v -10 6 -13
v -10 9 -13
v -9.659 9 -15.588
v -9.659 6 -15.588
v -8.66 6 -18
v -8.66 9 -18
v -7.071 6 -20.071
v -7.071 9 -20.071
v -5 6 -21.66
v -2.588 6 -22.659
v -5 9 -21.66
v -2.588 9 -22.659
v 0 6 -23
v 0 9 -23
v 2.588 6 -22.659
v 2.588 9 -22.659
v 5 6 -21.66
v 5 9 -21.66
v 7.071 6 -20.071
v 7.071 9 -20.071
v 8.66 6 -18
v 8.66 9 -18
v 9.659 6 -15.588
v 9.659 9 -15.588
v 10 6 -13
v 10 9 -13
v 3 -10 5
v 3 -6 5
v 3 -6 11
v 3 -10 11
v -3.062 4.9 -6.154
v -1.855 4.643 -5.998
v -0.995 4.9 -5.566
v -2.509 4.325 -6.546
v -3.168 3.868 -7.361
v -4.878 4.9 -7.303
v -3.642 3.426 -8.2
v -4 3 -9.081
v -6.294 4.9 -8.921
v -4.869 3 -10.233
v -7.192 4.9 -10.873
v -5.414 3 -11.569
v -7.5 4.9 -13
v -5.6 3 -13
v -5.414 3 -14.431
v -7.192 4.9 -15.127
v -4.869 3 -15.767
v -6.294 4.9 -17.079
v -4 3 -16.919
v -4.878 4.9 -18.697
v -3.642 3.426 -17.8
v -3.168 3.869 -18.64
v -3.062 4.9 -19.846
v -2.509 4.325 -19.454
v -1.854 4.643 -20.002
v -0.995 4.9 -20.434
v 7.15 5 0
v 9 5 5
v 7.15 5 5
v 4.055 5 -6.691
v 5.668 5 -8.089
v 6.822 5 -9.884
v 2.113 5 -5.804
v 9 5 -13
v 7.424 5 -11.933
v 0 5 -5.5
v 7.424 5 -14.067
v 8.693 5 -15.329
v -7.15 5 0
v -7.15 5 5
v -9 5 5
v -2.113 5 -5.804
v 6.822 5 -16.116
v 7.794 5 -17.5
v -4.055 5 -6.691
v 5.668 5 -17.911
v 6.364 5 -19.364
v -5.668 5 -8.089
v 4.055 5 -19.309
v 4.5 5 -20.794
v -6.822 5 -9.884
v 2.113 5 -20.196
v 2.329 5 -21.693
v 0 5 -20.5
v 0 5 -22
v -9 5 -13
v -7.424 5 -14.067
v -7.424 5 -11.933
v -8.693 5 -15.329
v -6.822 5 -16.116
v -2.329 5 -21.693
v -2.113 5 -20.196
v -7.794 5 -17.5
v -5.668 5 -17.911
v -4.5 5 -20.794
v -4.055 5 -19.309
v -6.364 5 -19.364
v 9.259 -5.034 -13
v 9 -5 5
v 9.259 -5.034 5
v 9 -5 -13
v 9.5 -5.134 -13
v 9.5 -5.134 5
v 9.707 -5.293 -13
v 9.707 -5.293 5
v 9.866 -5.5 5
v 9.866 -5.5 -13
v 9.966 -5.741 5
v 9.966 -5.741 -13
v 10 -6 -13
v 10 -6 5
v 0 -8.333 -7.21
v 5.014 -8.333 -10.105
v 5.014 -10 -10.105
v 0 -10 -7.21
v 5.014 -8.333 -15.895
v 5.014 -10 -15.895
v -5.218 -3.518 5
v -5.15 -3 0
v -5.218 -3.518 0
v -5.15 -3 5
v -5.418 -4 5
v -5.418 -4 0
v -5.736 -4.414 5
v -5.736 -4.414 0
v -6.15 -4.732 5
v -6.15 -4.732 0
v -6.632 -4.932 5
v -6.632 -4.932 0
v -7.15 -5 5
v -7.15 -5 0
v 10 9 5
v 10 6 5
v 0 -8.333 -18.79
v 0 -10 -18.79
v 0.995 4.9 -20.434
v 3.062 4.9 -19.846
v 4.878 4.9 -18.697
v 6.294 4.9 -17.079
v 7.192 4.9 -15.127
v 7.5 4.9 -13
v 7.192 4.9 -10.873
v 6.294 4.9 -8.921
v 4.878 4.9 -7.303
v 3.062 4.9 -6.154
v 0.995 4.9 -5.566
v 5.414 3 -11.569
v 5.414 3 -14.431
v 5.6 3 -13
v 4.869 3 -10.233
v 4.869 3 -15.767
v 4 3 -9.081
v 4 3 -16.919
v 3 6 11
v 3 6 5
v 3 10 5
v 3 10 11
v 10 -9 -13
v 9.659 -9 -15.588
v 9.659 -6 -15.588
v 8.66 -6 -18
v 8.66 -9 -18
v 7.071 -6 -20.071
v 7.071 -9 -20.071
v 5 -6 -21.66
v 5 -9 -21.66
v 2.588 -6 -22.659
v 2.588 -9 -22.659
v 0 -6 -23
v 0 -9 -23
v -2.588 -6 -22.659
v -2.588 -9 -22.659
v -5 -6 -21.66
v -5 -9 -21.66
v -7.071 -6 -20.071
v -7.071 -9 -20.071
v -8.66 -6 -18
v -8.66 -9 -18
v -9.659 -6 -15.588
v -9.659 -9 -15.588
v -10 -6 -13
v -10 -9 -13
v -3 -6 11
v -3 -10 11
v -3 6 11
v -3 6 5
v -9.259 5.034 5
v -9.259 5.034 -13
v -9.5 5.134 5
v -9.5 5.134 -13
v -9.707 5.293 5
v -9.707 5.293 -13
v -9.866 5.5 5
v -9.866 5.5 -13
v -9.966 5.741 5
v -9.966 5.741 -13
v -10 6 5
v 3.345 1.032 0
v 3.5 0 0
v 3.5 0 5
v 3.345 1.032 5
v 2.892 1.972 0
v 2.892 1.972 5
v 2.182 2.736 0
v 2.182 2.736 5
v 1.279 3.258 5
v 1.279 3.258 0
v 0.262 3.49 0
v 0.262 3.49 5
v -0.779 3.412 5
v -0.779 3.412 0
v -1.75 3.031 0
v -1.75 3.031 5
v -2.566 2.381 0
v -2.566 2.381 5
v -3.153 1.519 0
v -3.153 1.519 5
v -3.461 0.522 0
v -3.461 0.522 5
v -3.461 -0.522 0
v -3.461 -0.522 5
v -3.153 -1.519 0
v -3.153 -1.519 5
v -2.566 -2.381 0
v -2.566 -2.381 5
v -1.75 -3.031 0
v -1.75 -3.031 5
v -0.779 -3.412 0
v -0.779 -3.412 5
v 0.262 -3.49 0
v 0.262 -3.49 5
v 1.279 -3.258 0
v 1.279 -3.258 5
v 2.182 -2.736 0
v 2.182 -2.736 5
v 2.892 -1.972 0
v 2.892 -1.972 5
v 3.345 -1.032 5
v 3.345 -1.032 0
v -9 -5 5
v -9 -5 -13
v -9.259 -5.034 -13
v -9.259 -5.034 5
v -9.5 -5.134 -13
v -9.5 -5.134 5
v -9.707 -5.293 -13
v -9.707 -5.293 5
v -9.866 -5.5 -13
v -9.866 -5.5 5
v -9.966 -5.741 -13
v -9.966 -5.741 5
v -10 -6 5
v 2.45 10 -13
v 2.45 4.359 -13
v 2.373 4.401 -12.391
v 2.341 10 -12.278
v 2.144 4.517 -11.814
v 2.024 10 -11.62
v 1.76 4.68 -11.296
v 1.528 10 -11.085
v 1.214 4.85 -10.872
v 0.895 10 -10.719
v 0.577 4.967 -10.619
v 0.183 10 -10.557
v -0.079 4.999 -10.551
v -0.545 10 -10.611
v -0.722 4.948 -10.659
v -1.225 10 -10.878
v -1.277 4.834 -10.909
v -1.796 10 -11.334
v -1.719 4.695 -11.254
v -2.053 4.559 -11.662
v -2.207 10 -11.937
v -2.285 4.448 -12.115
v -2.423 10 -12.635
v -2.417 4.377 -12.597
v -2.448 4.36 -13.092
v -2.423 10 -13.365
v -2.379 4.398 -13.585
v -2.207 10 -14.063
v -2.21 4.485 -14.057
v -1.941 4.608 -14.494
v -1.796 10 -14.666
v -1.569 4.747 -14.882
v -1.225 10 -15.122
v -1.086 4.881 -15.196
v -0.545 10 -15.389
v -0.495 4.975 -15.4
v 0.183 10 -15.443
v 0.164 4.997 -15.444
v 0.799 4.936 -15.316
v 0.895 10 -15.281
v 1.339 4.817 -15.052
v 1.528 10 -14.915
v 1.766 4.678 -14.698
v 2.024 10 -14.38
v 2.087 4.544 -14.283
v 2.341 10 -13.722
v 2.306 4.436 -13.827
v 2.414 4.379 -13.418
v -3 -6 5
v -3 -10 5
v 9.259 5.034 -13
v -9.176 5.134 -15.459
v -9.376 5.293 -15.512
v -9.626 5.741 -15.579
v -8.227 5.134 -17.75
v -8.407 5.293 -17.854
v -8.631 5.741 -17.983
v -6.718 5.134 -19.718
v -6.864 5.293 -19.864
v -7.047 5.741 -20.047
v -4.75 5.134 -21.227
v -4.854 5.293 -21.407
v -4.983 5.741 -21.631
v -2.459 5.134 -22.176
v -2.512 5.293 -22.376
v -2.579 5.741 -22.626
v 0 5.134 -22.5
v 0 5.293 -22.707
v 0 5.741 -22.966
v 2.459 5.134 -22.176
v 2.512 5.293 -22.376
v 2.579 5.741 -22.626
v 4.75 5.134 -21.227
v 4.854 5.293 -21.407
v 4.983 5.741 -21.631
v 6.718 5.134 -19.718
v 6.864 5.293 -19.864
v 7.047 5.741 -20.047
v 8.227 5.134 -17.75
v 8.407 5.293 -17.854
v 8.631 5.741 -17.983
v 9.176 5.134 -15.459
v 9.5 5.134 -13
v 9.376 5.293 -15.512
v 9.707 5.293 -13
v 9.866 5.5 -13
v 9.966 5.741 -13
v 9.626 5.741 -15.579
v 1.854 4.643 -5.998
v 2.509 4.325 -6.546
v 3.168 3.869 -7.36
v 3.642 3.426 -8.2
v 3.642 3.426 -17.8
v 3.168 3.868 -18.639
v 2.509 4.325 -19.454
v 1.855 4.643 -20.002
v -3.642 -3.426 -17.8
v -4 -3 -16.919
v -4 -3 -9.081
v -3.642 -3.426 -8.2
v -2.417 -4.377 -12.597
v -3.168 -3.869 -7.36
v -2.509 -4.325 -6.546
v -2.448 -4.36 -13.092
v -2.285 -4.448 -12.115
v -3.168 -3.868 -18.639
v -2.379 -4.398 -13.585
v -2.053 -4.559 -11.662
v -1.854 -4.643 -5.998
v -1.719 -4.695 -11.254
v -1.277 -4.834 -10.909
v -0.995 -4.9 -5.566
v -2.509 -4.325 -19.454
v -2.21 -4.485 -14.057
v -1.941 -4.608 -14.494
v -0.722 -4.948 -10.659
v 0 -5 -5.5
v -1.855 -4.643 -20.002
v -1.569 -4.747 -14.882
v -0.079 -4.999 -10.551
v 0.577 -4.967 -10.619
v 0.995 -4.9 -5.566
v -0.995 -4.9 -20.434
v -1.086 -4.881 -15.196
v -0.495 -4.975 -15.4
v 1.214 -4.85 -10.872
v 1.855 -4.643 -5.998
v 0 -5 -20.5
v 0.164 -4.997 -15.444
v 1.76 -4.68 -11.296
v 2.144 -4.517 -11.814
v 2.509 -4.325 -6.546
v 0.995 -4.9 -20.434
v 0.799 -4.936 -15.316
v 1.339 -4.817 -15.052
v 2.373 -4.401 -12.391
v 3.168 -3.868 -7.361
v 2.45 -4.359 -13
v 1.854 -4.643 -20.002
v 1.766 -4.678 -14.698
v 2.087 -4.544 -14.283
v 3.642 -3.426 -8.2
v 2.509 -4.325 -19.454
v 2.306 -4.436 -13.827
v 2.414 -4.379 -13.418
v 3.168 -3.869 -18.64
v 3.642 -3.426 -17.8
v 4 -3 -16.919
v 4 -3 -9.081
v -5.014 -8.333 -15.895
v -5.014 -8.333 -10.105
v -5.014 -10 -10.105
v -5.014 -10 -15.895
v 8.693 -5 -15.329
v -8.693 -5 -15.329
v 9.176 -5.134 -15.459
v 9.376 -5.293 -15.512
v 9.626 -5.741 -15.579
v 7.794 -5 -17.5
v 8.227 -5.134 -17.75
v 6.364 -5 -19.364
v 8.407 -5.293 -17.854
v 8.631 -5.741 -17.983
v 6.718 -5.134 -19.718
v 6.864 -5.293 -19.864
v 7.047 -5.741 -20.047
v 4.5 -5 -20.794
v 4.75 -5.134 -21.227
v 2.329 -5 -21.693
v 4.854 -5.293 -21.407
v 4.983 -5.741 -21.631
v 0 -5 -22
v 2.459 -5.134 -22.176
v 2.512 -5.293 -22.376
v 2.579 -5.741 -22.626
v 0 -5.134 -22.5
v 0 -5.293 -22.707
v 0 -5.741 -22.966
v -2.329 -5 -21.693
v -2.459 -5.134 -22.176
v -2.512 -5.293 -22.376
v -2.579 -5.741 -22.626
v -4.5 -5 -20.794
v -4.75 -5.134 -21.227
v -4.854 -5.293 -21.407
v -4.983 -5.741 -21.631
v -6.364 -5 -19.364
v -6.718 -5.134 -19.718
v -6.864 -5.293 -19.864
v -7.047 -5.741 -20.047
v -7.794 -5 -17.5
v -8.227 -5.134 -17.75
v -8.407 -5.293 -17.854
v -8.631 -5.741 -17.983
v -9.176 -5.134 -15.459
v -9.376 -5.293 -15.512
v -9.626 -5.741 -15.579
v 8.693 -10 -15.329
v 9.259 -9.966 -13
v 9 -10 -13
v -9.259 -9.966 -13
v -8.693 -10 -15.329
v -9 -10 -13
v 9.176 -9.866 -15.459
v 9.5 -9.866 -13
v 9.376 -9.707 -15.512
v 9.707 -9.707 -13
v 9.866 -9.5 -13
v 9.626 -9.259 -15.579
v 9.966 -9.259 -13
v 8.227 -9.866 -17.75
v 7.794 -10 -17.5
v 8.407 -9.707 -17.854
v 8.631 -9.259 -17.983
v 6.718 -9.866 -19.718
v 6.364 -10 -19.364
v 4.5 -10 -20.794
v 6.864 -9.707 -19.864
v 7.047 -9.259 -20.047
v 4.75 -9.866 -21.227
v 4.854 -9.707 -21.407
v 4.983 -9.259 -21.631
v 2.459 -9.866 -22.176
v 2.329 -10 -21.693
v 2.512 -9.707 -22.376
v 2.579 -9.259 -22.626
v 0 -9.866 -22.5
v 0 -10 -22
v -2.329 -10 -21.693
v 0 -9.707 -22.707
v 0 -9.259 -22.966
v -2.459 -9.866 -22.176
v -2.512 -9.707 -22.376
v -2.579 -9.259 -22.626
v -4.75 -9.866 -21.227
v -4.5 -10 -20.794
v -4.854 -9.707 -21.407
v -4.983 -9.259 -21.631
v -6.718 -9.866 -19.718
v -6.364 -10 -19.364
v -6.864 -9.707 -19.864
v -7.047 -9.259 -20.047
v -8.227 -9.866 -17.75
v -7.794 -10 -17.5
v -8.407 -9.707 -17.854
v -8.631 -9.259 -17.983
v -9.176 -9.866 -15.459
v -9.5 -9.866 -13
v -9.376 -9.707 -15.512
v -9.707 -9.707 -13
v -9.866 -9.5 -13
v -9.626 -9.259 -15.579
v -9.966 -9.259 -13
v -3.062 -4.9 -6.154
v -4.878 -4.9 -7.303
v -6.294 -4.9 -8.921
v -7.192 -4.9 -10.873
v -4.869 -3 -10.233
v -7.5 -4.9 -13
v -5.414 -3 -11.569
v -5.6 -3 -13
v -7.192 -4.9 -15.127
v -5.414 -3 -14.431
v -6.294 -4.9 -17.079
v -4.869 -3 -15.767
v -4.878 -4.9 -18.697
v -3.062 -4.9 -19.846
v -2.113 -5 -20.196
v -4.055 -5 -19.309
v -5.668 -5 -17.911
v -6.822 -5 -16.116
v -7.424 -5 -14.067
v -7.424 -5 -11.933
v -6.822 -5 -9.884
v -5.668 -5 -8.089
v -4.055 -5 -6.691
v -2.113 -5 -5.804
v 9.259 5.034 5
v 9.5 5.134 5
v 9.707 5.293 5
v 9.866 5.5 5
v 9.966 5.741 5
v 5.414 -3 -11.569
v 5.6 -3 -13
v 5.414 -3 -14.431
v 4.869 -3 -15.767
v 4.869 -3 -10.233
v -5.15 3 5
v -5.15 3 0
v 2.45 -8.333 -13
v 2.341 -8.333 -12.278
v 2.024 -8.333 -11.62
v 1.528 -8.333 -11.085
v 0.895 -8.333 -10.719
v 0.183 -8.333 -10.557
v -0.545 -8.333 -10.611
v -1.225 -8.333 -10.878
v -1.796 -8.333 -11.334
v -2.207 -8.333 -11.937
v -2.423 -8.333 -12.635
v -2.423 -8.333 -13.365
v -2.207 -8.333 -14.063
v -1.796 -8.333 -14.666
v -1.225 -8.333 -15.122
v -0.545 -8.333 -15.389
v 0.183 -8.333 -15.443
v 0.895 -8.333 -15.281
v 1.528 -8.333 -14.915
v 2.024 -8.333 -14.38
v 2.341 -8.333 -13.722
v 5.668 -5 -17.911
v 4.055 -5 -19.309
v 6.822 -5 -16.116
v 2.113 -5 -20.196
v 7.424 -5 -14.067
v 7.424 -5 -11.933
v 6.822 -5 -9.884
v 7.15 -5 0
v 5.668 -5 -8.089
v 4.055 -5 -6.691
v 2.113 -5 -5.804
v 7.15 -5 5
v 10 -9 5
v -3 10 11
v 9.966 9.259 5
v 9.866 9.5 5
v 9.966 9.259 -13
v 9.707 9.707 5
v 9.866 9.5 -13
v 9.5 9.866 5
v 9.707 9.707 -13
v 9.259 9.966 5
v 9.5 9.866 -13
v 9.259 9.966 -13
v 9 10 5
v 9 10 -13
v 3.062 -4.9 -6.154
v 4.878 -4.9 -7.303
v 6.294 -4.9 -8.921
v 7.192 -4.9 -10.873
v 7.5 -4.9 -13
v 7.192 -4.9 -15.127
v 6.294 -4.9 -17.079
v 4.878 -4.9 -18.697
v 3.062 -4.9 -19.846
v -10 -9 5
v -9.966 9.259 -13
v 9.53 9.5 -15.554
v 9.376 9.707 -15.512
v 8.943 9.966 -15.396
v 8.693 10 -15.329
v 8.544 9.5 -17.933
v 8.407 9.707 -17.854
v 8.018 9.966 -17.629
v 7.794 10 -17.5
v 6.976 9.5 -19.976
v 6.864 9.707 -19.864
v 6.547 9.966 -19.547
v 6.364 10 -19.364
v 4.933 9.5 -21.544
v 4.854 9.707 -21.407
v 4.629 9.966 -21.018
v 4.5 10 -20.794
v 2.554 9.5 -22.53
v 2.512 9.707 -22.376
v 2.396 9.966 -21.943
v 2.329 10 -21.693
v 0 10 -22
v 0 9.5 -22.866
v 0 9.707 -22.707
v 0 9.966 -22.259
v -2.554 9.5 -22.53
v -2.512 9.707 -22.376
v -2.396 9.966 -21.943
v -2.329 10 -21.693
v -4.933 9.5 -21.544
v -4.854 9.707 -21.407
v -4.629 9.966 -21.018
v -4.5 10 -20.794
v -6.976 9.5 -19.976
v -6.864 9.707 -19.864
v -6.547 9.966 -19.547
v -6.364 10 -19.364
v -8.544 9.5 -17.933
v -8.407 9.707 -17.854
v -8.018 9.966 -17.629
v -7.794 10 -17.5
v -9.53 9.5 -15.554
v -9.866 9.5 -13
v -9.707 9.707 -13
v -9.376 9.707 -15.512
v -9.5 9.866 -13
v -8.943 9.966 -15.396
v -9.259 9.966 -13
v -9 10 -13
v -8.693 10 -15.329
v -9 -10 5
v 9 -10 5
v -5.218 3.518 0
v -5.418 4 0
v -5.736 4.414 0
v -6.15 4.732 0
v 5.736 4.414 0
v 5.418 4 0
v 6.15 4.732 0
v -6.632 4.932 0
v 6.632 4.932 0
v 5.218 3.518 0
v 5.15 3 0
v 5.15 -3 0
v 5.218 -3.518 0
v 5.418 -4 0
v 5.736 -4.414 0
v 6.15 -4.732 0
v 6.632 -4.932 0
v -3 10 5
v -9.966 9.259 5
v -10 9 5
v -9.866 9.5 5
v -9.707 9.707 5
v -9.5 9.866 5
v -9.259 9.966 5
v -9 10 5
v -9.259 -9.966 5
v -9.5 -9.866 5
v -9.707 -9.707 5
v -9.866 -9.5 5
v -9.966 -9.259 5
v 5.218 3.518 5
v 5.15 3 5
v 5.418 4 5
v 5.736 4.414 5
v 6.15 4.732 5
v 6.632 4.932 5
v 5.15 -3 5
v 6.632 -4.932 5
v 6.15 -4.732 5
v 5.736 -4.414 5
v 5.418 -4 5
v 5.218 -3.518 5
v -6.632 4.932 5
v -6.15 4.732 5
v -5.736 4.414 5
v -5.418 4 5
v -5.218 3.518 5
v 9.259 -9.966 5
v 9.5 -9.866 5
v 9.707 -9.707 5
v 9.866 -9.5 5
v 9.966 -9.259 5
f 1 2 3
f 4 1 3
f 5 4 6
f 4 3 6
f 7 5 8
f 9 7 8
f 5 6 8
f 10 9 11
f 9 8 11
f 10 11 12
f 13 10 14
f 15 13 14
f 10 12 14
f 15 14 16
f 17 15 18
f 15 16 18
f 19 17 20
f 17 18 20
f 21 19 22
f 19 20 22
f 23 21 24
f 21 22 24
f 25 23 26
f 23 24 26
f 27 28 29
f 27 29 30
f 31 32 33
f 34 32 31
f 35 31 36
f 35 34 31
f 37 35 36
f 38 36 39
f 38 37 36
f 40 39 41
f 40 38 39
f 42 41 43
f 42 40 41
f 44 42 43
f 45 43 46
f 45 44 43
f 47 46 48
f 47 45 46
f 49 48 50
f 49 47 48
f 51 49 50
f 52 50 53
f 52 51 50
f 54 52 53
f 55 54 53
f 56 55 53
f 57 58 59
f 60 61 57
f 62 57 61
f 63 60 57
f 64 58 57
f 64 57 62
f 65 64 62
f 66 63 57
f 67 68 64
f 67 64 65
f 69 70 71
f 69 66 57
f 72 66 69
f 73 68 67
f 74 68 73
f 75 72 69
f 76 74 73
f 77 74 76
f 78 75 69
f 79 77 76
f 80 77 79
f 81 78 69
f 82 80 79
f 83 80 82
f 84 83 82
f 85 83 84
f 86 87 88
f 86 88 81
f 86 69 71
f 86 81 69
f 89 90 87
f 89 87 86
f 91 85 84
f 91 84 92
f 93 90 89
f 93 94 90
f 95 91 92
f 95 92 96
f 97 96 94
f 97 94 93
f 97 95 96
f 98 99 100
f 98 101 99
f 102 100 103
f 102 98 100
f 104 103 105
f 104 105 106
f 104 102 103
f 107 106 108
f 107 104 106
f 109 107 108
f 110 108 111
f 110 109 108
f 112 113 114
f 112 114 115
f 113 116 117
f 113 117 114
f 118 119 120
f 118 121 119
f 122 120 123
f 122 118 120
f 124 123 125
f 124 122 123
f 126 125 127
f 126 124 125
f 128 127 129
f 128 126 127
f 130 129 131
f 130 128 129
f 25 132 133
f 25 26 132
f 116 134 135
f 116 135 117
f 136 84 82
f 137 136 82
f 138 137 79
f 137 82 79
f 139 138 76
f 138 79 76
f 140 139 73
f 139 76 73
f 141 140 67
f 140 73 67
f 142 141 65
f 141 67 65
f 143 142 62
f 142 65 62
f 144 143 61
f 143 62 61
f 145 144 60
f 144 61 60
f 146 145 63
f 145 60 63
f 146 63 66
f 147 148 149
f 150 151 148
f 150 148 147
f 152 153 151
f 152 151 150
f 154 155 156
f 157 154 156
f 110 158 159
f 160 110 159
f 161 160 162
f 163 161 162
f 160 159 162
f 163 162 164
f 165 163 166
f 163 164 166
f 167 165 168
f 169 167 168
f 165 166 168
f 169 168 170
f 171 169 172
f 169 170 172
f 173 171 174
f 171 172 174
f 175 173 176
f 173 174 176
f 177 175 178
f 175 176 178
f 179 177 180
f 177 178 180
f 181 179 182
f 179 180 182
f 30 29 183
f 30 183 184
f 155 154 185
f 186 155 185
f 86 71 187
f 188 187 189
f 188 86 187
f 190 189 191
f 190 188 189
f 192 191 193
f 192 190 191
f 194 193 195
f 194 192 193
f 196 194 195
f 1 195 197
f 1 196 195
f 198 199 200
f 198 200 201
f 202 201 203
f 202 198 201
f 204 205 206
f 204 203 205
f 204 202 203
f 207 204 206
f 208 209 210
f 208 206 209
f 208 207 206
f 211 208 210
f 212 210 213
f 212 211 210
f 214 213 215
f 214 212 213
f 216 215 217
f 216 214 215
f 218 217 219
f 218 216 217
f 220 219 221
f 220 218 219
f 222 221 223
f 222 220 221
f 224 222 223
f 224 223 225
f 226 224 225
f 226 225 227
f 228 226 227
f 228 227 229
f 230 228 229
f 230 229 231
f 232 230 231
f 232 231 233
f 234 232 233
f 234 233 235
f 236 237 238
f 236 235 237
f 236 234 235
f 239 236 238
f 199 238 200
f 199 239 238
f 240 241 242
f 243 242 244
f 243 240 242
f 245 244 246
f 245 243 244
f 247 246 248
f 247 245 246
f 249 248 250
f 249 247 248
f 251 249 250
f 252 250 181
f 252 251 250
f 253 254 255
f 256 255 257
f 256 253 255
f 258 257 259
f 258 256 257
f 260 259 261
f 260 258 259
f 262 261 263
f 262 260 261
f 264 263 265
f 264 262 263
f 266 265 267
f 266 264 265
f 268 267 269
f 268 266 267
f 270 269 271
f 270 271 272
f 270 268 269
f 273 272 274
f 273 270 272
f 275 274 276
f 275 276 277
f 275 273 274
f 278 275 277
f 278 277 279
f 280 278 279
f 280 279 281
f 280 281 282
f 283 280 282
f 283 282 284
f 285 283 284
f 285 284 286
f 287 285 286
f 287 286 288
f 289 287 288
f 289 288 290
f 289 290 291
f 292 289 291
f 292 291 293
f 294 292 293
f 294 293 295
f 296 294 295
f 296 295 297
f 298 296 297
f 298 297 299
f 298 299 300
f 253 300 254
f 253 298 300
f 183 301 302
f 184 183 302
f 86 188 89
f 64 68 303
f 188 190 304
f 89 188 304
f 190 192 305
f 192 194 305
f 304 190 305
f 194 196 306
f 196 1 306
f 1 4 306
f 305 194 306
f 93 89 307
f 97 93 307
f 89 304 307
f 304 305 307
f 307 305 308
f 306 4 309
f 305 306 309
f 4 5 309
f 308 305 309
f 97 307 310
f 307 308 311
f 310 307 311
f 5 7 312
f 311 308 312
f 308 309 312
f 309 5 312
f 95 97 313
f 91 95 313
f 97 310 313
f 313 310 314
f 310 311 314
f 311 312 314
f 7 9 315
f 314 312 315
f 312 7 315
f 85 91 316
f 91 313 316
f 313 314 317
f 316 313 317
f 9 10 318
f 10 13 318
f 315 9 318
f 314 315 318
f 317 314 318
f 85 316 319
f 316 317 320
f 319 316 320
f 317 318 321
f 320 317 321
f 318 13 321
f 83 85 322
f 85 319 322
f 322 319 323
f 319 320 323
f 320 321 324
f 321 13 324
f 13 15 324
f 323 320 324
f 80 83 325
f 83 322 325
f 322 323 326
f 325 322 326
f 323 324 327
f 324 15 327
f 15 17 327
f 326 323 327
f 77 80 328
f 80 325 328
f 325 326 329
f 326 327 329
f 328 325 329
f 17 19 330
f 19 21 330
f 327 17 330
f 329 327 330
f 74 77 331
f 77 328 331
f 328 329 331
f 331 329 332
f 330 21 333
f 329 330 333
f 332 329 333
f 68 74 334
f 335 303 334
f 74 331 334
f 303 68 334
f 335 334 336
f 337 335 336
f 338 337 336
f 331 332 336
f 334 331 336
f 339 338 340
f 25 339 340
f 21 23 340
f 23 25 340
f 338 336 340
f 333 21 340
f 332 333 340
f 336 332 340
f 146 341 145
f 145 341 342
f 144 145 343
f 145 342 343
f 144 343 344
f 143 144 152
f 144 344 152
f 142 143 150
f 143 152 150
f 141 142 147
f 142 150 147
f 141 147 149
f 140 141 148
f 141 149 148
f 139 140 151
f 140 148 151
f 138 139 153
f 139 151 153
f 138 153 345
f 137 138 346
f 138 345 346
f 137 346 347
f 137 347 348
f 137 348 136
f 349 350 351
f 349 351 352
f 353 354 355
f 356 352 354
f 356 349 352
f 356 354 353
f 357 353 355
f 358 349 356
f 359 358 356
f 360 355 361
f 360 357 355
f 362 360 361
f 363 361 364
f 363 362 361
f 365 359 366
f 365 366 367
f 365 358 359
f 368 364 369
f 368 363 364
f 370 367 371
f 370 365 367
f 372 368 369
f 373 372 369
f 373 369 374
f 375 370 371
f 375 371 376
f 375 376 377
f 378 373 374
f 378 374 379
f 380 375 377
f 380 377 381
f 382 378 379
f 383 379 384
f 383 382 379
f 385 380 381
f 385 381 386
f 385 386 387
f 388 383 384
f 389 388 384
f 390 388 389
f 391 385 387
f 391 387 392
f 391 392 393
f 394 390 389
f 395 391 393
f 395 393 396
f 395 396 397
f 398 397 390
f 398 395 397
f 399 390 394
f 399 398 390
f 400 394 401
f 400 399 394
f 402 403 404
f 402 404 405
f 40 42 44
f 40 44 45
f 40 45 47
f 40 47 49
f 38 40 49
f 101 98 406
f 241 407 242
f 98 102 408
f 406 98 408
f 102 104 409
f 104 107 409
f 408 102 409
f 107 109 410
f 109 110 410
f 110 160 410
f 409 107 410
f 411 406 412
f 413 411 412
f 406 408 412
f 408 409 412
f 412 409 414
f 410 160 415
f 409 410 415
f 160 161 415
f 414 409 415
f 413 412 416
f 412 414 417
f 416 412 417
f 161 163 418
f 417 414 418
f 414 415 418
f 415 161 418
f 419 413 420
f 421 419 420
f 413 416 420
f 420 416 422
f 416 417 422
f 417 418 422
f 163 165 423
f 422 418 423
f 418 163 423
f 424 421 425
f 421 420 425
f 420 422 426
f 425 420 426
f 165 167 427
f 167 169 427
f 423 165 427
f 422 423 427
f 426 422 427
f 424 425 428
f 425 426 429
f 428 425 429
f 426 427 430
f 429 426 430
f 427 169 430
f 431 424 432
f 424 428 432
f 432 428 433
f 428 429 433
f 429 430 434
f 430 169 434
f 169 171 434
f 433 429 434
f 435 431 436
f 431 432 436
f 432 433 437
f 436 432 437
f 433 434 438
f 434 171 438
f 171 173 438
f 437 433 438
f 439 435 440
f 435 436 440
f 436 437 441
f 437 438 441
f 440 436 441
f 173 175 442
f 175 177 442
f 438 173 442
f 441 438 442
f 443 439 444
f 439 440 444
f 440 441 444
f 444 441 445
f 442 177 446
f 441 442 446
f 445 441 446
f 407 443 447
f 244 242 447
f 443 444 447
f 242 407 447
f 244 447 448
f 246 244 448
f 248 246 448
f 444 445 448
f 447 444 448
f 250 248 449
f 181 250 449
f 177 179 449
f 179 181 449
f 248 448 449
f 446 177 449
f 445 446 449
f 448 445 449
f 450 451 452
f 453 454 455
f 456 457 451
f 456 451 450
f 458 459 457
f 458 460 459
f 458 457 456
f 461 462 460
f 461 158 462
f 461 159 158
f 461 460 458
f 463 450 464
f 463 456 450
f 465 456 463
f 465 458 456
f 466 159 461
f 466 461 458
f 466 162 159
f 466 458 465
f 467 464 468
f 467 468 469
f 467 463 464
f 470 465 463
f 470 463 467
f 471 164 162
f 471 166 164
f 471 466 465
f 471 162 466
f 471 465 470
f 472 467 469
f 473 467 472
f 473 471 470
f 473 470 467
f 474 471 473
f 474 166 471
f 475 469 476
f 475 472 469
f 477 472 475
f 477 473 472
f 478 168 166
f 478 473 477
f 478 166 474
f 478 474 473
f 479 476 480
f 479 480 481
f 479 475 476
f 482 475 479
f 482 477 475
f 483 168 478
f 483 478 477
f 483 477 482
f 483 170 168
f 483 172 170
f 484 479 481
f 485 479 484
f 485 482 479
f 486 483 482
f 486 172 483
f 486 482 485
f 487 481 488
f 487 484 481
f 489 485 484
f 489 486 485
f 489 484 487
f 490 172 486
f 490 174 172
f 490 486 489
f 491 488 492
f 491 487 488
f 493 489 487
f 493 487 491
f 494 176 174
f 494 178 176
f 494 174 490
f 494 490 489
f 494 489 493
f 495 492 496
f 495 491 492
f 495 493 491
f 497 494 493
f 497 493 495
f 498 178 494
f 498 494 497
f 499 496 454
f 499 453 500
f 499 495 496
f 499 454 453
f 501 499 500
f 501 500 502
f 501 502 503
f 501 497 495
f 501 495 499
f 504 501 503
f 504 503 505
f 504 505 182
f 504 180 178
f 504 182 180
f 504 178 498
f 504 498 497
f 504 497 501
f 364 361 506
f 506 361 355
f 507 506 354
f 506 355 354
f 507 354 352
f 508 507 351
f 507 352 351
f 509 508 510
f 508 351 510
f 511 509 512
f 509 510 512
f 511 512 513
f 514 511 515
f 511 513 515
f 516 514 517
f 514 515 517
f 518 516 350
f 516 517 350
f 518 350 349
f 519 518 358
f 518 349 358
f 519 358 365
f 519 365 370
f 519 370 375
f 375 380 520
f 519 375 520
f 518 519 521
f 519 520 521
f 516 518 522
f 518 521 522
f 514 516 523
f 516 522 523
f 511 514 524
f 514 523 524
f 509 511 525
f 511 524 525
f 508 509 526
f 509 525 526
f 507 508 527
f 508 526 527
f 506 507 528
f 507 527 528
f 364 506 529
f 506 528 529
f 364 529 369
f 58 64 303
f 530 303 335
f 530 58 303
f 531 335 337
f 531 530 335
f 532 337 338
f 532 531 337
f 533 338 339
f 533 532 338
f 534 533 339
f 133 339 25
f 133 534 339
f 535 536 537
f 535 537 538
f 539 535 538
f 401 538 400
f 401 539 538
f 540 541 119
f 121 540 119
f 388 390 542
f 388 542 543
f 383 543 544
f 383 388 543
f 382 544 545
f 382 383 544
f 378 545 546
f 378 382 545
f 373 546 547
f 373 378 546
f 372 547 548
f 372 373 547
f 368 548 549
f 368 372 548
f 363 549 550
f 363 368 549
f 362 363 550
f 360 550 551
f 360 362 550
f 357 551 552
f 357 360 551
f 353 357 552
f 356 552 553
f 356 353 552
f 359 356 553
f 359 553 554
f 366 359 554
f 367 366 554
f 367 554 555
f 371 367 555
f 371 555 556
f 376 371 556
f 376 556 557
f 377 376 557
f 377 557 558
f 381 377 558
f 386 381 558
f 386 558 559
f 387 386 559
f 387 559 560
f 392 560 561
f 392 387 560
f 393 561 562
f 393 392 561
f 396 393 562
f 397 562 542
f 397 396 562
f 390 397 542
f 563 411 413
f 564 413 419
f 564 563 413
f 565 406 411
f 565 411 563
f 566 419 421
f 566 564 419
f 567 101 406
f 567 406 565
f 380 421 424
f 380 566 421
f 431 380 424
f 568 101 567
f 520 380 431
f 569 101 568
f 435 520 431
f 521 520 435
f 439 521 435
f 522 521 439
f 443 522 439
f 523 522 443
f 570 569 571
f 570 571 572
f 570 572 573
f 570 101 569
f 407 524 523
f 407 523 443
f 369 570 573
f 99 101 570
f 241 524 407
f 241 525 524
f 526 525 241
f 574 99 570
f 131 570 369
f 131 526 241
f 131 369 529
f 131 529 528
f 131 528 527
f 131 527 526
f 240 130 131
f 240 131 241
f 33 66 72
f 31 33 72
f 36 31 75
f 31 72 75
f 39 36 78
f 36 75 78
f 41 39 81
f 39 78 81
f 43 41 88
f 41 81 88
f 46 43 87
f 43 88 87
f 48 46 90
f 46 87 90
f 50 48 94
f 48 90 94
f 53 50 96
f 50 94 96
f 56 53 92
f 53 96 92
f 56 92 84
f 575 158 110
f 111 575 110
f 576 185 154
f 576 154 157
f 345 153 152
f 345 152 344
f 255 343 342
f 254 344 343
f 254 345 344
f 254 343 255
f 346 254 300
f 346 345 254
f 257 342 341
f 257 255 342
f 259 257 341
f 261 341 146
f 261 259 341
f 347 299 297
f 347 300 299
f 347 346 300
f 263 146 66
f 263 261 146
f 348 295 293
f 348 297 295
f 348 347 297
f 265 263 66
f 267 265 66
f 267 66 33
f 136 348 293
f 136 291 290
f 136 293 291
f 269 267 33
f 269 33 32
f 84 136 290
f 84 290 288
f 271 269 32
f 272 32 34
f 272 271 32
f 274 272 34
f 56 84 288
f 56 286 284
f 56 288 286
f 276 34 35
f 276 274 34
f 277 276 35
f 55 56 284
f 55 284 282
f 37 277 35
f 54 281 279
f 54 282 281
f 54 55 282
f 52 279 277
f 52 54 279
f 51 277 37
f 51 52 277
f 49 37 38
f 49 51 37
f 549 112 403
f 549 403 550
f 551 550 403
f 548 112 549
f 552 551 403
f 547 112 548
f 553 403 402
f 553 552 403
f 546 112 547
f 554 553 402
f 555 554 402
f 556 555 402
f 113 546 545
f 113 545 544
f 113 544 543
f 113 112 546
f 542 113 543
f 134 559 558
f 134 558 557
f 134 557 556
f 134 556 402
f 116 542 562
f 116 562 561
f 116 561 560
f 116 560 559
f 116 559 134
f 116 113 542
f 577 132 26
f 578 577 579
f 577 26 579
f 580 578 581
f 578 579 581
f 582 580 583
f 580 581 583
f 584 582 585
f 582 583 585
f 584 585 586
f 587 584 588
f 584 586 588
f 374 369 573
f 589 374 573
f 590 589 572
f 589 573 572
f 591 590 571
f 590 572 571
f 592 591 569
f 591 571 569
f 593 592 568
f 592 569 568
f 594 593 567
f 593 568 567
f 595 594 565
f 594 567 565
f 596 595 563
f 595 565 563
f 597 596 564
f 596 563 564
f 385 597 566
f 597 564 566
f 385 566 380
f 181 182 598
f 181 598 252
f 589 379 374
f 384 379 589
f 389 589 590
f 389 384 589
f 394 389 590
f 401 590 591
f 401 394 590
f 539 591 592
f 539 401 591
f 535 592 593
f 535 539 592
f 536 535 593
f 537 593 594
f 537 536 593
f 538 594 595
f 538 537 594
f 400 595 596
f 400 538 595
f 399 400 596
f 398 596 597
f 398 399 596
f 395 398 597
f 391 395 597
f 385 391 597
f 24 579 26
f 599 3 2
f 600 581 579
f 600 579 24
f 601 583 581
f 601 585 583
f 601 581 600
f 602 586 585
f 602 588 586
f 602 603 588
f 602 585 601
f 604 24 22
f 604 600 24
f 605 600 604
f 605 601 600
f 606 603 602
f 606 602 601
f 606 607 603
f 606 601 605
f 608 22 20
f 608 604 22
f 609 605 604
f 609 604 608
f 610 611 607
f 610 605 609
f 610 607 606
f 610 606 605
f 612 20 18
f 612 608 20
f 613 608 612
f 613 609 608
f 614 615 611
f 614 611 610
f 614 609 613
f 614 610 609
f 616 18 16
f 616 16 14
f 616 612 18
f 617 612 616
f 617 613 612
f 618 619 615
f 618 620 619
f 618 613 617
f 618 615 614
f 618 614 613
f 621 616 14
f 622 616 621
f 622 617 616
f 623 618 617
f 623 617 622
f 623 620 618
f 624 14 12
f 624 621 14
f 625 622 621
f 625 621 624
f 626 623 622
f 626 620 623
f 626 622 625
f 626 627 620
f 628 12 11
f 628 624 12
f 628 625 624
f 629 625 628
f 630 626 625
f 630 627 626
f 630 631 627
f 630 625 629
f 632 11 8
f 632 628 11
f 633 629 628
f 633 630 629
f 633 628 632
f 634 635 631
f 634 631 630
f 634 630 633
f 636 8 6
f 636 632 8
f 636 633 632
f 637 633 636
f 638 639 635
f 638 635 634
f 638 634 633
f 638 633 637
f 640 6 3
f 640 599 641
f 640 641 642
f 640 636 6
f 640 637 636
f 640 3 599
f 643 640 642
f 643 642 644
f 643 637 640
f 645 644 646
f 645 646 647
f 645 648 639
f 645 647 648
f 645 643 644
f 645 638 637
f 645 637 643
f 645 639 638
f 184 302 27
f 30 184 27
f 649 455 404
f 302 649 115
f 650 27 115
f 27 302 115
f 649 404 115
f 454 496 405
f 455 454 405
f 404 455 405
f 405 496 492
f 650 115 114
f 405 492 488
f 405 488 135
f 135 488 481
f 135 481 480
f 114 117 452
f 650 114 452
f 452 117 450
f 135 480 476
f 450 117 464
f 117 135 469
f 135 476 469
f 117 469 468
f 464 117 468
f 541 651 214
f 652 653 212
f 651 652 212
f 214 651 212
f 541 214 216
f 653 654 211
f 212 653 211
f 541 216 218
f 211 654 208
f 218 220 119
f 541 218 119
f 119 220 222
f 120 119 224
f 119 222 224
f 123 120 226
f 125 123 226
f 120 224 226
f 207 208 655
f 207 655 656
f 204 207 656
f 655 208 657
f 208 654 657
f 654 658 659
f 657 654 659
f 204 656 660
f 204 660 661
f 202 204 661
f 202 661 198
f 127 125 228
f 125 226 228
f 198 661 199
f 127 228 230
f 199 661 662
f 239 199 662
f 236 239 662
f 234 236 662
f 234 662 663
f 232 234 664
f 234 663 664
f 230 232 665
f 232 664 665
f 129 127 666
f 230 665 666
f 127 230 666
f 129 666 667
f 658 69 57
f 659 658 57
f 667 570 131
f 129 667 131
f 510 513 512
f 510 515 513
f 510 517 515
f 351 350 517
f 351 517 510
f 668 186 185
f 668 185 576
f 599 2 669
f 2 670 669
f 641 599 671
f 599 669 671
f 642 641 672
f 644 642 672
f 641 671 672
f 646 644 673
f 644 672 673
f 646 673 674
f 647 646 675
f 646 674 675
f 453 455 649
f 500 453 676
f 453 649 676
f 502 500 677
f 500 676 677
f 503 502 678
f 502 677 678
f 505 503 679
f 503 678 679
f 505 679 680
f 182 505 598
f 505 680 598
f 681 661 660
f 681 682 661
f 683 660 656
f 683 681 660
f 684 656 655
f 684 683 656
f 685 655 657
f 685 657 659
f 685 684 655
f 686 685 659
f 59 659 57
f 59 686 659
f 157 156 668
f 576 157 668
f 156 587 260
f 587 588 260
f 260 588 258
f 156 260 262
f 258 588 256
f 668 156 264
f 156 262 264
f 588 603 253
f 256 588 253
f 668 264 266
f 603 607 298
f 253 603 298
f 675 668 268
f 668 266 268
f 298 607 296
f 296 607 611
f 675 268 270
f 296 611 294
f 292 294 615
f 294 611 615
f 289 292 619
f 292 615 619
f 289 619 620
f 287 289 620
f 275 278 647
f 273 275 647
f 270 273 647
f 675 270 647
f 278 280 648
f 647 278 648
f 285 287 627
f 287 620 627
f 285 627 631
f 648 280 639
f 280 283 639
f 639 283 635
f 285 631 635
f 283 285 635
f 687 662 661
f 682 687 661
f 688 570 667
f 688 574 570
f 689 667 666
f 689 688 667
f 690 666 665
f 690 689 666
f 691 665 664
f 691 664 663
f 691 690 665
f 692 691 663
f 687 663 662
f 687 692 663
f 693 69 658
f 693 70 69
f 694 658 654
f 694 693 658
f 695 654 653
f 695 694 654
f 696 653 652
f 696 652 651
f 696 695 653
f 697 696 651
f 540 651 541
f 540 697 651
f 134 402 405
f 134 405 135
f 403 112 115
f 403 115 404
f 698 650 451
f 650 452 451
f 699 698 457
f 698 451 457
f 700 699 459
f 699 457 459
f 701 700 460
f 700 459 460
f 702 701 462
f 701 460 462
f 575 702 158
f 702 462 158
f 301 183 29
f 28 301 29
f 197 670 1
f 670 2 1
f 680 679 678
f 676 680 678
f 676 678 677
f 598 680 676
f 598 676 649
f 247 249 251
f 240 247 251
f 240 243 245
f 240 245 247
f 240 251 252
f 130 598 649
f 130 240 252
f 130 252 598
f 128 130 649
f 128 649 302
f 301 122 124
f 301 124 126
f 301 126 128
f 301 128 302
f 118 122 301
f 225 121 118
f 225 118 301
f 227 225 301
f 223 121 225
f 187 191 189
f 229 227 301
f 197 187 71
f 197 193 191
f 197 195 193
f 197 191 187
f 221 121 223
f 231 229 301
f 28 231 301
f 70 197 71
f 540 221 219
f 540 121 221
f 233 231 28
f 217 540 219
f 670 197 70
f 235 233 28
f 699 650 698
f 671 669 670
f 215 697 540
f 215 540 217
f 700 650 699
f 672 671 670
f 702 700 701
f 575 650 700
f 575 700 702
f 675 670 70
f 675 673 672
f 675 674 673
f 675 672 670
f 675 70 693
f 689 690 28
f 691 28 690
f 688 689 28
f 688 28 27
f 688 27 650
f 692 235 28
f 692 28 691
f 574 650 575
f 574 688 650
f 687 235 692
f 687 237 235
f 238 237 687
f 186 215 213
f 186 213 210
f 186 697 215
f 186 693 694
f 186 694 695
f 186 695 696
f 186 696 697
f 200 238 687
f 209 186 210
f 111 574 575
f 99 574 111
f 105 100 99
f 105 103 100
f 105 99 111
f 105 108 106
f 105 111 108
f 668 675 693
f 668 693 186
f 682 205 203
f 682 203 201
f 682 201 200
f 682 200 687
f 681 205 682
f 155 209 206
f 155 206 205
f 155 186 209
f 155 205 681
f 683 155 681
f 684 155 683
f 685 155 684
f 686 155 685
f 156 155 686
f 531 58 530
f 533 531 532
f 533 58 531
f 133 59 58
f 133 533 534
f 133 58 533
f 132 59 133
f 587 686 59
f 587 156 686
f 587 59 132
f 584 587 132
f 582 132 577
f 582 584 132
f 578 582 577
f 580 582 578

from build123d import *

# Parameters (mm, degrees)
CYLINDER006_R            = 2.45
CYLINDER006_DEPTH        = 1000
PRISM_DEPTH              = 5
CYLINDER005_R            = 5
CYLINDER005_DEPTH        = 1000
CYLINDER003_R            = 10
CYLINDER003_DEPTH        = 5
CYLINDER004_R            = 7.5
CYLINDER004_DEPTH        = 7
CUBE008_W                = 20
CUBE008_H                = 5
CUBE008_DEPTH            = 13
UNION001_PLACEMENT_ANGLE = 180
CYLINDER001_R            = 10
CYLINDER001_DEPTH        = 5
CYLINDER002_R            = 7.5
CYLINDER002_DEPTH        = 7
CUBE007_W                = 20
CUBE007_H                = 5
CUBE007_DEPTH            = 13
CUBE006_W                = 100
CUBE006_H                = 10
CUBE006_DEPTH            = 100
CUBE005_W                = 100
CUBE005_H                = 10
CUBE005_DEPTH            = 100
CUBE002_W                = 4
CUBE002_H                = 6
CUBE002_DEPTH            = 11
CUBE003_W                = 4
CUBE003_H                = 6
CUBE003_DEPTH            = 11
CUBE004_W                = 4
CUBE004_H                = 6
CUBE004_DEPTH            = 11
CUBE001_W                = 4
CUBE001_H                = 6
CUBE001_DEPTH            = 11
CYLINDER_R               = 3.5
CYLINDER_DEPTH           = 100
CUBE_W                   = 20
CUBE_H                   = 20
CUBE_DEPTH               = 5
CHAMFER_SIZE             = 1.9
CHAMFER001_SIZE          = 1.9
CHAMFER002_SIZE          = 1.9
CHAMFER003_SIZE          = 1.9
FILLET_R                 = 2
FILLET001_R              = 2
FILLET002_R              = 2
FILLET003_R              = 2
FILLET004_R              = 1
FILLET005_R              = 1
FILLET006_R              = 1
FILLET007_R              = 1


with BuildPart() as cylinder006:
    # cylinder006 → cylinder006 (new body)
    with BuildSketch(Plane(origin=(0, 500, -13), x_dir=(1, 0, 0), z_dir=(0, -1, 0))):
        Circle(CYLINDER006_R)
    extrude(amount=CYLINDER006_DEPTH)


with BuildPart() as prism:
    # prism → prism (new body)
    with BuildSketch(Plane(origin=(0, -8.33333, -13), x_dir=(0, 0, -1), z_dir=(0, -1, 0))):
        Polygon((5.79, 0), (2.895, 5.014287), (-2.895, 5.014287), (-5.79, 0), (-2.895, -5.014287), (2.895, -5.014287), align=None)
    extrude(amount=PRISM_DEPTH)


with BuildPart() as union002:
    # cylinder005 → cylinder005 (new body)
    with BuildSketch(Plane.XY.offset(-500)):
        Circle(CYLINDER005_R)
    extrude(amount=CYLINDER005_DEPTH)

    # union002: union cylinder006, prism
    add(cylinder006.part)
    add(prism.part)


with BuildPart() as cylinder003:
    # cylinder003 → cylinder003 (new body)
    with BuildSketch(Plane(origin=(0, 10, -13), x_dir=(1, 0, 0), z_dir=(0, -1, 0))):
        Circle(CYLINDER003_R)
    extrude(amount=CYLINDER003_DEPTH)


with BuildPart() as cylinder004:
    # cylinder004 → cylinder004 (new body)
    with BuildSketch(Plane(origin=(0, 10, -13), x_dir=(1, 0, 0), z_dir=(0, -1, 0))):
        Circle(CYLINDER004_R)
    extrude(amount=CYLINDER004_DEPTH)


with BuildPart() as union001:
    # cube008 → cube008 (new body)
    with BuildSketch(Plane(origin=(-10, -10, -13), x_dir=(1, 0, 0), z_dir=(0, 0, 1))):
        with Locations((10, 2.5)):
            Rectangle(CUBE008_W, CUBE008_H)
    extrude(amount=CUBE008_DEPTH)

    # union001: union cylinder003, cylinder004
    add(cylinder003.part)
    add(cylinder004.part)


with BuildPart() as union001_1:
    # union001 placement: moved
    add(union001.part.rotate(Axis((0, 0, 0), (0, 0, 1)), UNION001_PLACEMENT_ANGLE))


with BuildPart() as cylinder001:
    # cylinder001 → cylinder001 (new body)
    with BuildSketch(Plane(origin=(0, 10, -13), x_dir=(1, 0, 0), z_dir=(0, -1, 0))):
        Circle(CYLINDER001_R)
    extrude(amount=CYLINDER001_DEPTH)


with BuildPart() as cylinder002:
    # cylinder002 → cylinder002 (new body)
    with BuildSketch(Plane(origin=(0, 10, -13), x_dir=(1, 0, 0), z_dir=(0, -1, 0))):
        Circle(CYLINDER002_R)
    extrude(amount=CYLINDER002_DEPTH)


with BuildPart() as difference002:
    # cube007 → cube007 (new body)
    with BuildSketch(Plane(origin=(-10, -10, -13), x_dir=(1, 0, 0), z_dir=(0, 0, 1))):
        with Locations((10, 2.5)):
            Rectangle(CUBE007_W, CUBE007_H)
    extrude(amount=CUBE007_DEPTH)

    # union: union cylinder001, cylinder002
    add(cylinder001.part)
    add(cylinder002.part)

    # Group003: union union001
    add(union001_1.part)

    # difference002: cut union002
    add(union002.part, mode=Mode.SUBTRACT)


with BuildPart() as cube006:
    # cube006 → cube006 (new body)
    with BuildSketch(Plane(origin=(-5.15, 5, -50), x_dir=(-1, 0, 0), z_dir=(0, 0, 1))):
        with Locations((50, 5)):
            Rectangle(CUBE006_W, CUBE006_H)
    extrude(amount=CUBE006_DEPTH)


with BuildPart() as group002:
    # cube005 → cube005 (new body)
    with BuildSketch(Plane(origin=(5.15, -5, -50), x_dir=(1, 0, 0), z_dir=(0, 0, 1))):
        with Locations((50, 5)):
            Rectangle(CUBE005_W, CUBE005_H)
    extrude(amount=CUBE005_DEPTH)

    # Group002: union cube006
    add(cube006.part)


with BuildPart() as cube002:
    # cube002 → cube002 (new body)
    with BuildSketch(Plane(origin=(3, 6, 0), x_dir=(0, 1, 0), z_dir=(0, 0, 1))):
        with Locations((2, 3)):
            Rectangle(CUBE002_W, CUBE002_H)
    extrude(amount=CUBE002_DEPTH)


with BuildPart() as cube003:
    # cube003 → cube003 (new body)
    with BuildSketch(Plane(origin=(-6, 3, 0), x_dir=(-1, 0, 0), z_dir=(0, 0, 1))):
        with Locations((2, 3)):
            Rectangle(CUBE003_W, CUBE003_H)
    extrude(amount=CUBE003_DEPTH)


with BuildPart() as cube004:
    # cube004 → cube004 (new body)
    with BuildSketch(Plane(origin=(-3, -6, 0), x_dir=(0, -1, 0), z_dir=(0, 0, 1))):
        with Locations((2, 3)):
            Rectangle(CUBE004_W, CUBE004_H)
    extrude(amount=CUBE004_DEPTH)


with BuildPart() as group:
    # cube001 → cube001 (new body)
    with BuildSketch(Plane(origin=(6, -3, 0), x_dir=(1, 0, 0), z_dir=(0, 0, 1))):
        with Locations((2, 3)):
            Rectangle(CUBE001_W, CUBE001_H)
    extrude(amount=CUBE001_DEPTH)

    # Group: union cube002, cube003, cube004
    add(cube002.part)
    add(cube003.part)
    add(cube004.part)


with BuildPart() as cylinder:
    # cylinder → cylinder (new body)
    with BuildSketch(Plane.XY.offset(-50)):
        Circle(CYLINDER_R)
    extrude(amount=CYLINDER_DEPTH)


with BuildPart() as fillet007:
    # cube → cube (new body)
    with BuildSketch(Plane(origin=(-10, -10, 0), x_dir=(1, 0, 0), z_dir=(0, 0, 1))):
        with Locations((10, 10)):
            Rectangle(CUBE_W, CUBE_H)
    extrude(amount=CUBE_DEPTH)

    # difference: cut cylinder
    add(cylinder.part, mode=Mode.SUBTRACT)

    # Group001: union Group
    add(group.part)

    # difference001: cut Group002
    add(group002.part, mode=Mode.SUBTRACT)

    # Group004: union difference002
    add(difference002.part)

    # Chamfer
    chamfer_edges = [fillet007.edges().sort_by_distance(p)[0] for p in [
        (6.566963, 3, -9.377156),
    ]]
    chamfer(chamfer_edges, length=CHAMFER_SIZE)

    # Chamfer001
    chamfer001_edges = [fillet007.edges().sort_by_distance(p)[0] for p in [
        (7.5, -3, -13),
    ]]
    chamfer(chamfer001_edges, length=CHAMFER001_SIZE)

    # Chamfer002
    chamfer002_edges = [fillet007.edges().sort_by_distance(p)[0] for p in [
        (-6.566963, -3, -9.377156),
    ]]
    chamfer(chamfer002_edges, length=CHAMFER002_SIZE)

    # Chamfer003
    chamfer003_edges = [fillet007.edges().sort_by_distance(p)[0] for p in [
        (-7.5, 3, -13),
    ]]
    chamfer(chamfer003_edges, length=CHAMFER003_SIZE)

    # Fillet
    fillet_edges = [fillet007.edges().sort_by_distance(p)[0] for p in [
        (-5.15, 5, 2.5),
    ]]
    fillet(fillet_edges, radius=FILLET_R)

    # Fillet001
    fillet001_edges = [fillet007.edges().sort_by_distance(p)[0] for p in [
        (-5.15, -5, 2.5),
    ]]
    fillet(fillet001_edges, radius=FILLET001_R)

    # Fillet002
    fillet002_edges = [fillet007.edges().sort_by_distance(p)[0] for p in [
        (5.15, 5, 2.5),
    ]]
    fillet(fillet002_edges, radius=FILLET002_R)

    # Fillet003
    fillet003_edges = [fillet007.edges().sort_by_distance(p)[0] for p in [
        (5.15, -5, 2.5),
    ]]
    fillet(fillet003_edges, radius=FILLET003_R)

    # Fillet004
    fillet004_edges = [fillet007.edges().sort_by_distance(p)[0] for p in [
        (-10, 10, -4),
    ]]
    fillet(fillet004_edges, radius=FILLET004_R)

    # Fillet005
    fillet005_edges = [fillet007.edges().sort_by_distance(p)[0] for p in [
        (-10, -10, -4),
    ]]
    fillet(fillet005_edges, radius=FILLET005_R)

    # Fillet006
    fillet006_edges = [fillet007.edges().sort_by_distance(p)[0] for p in [
        (-10, -5, -4),
    ]]
    fillet(fillet006_edges, radius=FILLET006_R)

    # Fillet007
    fillet007_edges = [fillet007.edges().sort_by_distance(p)[0] for p in [
        (-10, 5, -4),
    ]]
    fillet(fillet007_edges, radius=FILLET007_R)


solid = fillet007.part
